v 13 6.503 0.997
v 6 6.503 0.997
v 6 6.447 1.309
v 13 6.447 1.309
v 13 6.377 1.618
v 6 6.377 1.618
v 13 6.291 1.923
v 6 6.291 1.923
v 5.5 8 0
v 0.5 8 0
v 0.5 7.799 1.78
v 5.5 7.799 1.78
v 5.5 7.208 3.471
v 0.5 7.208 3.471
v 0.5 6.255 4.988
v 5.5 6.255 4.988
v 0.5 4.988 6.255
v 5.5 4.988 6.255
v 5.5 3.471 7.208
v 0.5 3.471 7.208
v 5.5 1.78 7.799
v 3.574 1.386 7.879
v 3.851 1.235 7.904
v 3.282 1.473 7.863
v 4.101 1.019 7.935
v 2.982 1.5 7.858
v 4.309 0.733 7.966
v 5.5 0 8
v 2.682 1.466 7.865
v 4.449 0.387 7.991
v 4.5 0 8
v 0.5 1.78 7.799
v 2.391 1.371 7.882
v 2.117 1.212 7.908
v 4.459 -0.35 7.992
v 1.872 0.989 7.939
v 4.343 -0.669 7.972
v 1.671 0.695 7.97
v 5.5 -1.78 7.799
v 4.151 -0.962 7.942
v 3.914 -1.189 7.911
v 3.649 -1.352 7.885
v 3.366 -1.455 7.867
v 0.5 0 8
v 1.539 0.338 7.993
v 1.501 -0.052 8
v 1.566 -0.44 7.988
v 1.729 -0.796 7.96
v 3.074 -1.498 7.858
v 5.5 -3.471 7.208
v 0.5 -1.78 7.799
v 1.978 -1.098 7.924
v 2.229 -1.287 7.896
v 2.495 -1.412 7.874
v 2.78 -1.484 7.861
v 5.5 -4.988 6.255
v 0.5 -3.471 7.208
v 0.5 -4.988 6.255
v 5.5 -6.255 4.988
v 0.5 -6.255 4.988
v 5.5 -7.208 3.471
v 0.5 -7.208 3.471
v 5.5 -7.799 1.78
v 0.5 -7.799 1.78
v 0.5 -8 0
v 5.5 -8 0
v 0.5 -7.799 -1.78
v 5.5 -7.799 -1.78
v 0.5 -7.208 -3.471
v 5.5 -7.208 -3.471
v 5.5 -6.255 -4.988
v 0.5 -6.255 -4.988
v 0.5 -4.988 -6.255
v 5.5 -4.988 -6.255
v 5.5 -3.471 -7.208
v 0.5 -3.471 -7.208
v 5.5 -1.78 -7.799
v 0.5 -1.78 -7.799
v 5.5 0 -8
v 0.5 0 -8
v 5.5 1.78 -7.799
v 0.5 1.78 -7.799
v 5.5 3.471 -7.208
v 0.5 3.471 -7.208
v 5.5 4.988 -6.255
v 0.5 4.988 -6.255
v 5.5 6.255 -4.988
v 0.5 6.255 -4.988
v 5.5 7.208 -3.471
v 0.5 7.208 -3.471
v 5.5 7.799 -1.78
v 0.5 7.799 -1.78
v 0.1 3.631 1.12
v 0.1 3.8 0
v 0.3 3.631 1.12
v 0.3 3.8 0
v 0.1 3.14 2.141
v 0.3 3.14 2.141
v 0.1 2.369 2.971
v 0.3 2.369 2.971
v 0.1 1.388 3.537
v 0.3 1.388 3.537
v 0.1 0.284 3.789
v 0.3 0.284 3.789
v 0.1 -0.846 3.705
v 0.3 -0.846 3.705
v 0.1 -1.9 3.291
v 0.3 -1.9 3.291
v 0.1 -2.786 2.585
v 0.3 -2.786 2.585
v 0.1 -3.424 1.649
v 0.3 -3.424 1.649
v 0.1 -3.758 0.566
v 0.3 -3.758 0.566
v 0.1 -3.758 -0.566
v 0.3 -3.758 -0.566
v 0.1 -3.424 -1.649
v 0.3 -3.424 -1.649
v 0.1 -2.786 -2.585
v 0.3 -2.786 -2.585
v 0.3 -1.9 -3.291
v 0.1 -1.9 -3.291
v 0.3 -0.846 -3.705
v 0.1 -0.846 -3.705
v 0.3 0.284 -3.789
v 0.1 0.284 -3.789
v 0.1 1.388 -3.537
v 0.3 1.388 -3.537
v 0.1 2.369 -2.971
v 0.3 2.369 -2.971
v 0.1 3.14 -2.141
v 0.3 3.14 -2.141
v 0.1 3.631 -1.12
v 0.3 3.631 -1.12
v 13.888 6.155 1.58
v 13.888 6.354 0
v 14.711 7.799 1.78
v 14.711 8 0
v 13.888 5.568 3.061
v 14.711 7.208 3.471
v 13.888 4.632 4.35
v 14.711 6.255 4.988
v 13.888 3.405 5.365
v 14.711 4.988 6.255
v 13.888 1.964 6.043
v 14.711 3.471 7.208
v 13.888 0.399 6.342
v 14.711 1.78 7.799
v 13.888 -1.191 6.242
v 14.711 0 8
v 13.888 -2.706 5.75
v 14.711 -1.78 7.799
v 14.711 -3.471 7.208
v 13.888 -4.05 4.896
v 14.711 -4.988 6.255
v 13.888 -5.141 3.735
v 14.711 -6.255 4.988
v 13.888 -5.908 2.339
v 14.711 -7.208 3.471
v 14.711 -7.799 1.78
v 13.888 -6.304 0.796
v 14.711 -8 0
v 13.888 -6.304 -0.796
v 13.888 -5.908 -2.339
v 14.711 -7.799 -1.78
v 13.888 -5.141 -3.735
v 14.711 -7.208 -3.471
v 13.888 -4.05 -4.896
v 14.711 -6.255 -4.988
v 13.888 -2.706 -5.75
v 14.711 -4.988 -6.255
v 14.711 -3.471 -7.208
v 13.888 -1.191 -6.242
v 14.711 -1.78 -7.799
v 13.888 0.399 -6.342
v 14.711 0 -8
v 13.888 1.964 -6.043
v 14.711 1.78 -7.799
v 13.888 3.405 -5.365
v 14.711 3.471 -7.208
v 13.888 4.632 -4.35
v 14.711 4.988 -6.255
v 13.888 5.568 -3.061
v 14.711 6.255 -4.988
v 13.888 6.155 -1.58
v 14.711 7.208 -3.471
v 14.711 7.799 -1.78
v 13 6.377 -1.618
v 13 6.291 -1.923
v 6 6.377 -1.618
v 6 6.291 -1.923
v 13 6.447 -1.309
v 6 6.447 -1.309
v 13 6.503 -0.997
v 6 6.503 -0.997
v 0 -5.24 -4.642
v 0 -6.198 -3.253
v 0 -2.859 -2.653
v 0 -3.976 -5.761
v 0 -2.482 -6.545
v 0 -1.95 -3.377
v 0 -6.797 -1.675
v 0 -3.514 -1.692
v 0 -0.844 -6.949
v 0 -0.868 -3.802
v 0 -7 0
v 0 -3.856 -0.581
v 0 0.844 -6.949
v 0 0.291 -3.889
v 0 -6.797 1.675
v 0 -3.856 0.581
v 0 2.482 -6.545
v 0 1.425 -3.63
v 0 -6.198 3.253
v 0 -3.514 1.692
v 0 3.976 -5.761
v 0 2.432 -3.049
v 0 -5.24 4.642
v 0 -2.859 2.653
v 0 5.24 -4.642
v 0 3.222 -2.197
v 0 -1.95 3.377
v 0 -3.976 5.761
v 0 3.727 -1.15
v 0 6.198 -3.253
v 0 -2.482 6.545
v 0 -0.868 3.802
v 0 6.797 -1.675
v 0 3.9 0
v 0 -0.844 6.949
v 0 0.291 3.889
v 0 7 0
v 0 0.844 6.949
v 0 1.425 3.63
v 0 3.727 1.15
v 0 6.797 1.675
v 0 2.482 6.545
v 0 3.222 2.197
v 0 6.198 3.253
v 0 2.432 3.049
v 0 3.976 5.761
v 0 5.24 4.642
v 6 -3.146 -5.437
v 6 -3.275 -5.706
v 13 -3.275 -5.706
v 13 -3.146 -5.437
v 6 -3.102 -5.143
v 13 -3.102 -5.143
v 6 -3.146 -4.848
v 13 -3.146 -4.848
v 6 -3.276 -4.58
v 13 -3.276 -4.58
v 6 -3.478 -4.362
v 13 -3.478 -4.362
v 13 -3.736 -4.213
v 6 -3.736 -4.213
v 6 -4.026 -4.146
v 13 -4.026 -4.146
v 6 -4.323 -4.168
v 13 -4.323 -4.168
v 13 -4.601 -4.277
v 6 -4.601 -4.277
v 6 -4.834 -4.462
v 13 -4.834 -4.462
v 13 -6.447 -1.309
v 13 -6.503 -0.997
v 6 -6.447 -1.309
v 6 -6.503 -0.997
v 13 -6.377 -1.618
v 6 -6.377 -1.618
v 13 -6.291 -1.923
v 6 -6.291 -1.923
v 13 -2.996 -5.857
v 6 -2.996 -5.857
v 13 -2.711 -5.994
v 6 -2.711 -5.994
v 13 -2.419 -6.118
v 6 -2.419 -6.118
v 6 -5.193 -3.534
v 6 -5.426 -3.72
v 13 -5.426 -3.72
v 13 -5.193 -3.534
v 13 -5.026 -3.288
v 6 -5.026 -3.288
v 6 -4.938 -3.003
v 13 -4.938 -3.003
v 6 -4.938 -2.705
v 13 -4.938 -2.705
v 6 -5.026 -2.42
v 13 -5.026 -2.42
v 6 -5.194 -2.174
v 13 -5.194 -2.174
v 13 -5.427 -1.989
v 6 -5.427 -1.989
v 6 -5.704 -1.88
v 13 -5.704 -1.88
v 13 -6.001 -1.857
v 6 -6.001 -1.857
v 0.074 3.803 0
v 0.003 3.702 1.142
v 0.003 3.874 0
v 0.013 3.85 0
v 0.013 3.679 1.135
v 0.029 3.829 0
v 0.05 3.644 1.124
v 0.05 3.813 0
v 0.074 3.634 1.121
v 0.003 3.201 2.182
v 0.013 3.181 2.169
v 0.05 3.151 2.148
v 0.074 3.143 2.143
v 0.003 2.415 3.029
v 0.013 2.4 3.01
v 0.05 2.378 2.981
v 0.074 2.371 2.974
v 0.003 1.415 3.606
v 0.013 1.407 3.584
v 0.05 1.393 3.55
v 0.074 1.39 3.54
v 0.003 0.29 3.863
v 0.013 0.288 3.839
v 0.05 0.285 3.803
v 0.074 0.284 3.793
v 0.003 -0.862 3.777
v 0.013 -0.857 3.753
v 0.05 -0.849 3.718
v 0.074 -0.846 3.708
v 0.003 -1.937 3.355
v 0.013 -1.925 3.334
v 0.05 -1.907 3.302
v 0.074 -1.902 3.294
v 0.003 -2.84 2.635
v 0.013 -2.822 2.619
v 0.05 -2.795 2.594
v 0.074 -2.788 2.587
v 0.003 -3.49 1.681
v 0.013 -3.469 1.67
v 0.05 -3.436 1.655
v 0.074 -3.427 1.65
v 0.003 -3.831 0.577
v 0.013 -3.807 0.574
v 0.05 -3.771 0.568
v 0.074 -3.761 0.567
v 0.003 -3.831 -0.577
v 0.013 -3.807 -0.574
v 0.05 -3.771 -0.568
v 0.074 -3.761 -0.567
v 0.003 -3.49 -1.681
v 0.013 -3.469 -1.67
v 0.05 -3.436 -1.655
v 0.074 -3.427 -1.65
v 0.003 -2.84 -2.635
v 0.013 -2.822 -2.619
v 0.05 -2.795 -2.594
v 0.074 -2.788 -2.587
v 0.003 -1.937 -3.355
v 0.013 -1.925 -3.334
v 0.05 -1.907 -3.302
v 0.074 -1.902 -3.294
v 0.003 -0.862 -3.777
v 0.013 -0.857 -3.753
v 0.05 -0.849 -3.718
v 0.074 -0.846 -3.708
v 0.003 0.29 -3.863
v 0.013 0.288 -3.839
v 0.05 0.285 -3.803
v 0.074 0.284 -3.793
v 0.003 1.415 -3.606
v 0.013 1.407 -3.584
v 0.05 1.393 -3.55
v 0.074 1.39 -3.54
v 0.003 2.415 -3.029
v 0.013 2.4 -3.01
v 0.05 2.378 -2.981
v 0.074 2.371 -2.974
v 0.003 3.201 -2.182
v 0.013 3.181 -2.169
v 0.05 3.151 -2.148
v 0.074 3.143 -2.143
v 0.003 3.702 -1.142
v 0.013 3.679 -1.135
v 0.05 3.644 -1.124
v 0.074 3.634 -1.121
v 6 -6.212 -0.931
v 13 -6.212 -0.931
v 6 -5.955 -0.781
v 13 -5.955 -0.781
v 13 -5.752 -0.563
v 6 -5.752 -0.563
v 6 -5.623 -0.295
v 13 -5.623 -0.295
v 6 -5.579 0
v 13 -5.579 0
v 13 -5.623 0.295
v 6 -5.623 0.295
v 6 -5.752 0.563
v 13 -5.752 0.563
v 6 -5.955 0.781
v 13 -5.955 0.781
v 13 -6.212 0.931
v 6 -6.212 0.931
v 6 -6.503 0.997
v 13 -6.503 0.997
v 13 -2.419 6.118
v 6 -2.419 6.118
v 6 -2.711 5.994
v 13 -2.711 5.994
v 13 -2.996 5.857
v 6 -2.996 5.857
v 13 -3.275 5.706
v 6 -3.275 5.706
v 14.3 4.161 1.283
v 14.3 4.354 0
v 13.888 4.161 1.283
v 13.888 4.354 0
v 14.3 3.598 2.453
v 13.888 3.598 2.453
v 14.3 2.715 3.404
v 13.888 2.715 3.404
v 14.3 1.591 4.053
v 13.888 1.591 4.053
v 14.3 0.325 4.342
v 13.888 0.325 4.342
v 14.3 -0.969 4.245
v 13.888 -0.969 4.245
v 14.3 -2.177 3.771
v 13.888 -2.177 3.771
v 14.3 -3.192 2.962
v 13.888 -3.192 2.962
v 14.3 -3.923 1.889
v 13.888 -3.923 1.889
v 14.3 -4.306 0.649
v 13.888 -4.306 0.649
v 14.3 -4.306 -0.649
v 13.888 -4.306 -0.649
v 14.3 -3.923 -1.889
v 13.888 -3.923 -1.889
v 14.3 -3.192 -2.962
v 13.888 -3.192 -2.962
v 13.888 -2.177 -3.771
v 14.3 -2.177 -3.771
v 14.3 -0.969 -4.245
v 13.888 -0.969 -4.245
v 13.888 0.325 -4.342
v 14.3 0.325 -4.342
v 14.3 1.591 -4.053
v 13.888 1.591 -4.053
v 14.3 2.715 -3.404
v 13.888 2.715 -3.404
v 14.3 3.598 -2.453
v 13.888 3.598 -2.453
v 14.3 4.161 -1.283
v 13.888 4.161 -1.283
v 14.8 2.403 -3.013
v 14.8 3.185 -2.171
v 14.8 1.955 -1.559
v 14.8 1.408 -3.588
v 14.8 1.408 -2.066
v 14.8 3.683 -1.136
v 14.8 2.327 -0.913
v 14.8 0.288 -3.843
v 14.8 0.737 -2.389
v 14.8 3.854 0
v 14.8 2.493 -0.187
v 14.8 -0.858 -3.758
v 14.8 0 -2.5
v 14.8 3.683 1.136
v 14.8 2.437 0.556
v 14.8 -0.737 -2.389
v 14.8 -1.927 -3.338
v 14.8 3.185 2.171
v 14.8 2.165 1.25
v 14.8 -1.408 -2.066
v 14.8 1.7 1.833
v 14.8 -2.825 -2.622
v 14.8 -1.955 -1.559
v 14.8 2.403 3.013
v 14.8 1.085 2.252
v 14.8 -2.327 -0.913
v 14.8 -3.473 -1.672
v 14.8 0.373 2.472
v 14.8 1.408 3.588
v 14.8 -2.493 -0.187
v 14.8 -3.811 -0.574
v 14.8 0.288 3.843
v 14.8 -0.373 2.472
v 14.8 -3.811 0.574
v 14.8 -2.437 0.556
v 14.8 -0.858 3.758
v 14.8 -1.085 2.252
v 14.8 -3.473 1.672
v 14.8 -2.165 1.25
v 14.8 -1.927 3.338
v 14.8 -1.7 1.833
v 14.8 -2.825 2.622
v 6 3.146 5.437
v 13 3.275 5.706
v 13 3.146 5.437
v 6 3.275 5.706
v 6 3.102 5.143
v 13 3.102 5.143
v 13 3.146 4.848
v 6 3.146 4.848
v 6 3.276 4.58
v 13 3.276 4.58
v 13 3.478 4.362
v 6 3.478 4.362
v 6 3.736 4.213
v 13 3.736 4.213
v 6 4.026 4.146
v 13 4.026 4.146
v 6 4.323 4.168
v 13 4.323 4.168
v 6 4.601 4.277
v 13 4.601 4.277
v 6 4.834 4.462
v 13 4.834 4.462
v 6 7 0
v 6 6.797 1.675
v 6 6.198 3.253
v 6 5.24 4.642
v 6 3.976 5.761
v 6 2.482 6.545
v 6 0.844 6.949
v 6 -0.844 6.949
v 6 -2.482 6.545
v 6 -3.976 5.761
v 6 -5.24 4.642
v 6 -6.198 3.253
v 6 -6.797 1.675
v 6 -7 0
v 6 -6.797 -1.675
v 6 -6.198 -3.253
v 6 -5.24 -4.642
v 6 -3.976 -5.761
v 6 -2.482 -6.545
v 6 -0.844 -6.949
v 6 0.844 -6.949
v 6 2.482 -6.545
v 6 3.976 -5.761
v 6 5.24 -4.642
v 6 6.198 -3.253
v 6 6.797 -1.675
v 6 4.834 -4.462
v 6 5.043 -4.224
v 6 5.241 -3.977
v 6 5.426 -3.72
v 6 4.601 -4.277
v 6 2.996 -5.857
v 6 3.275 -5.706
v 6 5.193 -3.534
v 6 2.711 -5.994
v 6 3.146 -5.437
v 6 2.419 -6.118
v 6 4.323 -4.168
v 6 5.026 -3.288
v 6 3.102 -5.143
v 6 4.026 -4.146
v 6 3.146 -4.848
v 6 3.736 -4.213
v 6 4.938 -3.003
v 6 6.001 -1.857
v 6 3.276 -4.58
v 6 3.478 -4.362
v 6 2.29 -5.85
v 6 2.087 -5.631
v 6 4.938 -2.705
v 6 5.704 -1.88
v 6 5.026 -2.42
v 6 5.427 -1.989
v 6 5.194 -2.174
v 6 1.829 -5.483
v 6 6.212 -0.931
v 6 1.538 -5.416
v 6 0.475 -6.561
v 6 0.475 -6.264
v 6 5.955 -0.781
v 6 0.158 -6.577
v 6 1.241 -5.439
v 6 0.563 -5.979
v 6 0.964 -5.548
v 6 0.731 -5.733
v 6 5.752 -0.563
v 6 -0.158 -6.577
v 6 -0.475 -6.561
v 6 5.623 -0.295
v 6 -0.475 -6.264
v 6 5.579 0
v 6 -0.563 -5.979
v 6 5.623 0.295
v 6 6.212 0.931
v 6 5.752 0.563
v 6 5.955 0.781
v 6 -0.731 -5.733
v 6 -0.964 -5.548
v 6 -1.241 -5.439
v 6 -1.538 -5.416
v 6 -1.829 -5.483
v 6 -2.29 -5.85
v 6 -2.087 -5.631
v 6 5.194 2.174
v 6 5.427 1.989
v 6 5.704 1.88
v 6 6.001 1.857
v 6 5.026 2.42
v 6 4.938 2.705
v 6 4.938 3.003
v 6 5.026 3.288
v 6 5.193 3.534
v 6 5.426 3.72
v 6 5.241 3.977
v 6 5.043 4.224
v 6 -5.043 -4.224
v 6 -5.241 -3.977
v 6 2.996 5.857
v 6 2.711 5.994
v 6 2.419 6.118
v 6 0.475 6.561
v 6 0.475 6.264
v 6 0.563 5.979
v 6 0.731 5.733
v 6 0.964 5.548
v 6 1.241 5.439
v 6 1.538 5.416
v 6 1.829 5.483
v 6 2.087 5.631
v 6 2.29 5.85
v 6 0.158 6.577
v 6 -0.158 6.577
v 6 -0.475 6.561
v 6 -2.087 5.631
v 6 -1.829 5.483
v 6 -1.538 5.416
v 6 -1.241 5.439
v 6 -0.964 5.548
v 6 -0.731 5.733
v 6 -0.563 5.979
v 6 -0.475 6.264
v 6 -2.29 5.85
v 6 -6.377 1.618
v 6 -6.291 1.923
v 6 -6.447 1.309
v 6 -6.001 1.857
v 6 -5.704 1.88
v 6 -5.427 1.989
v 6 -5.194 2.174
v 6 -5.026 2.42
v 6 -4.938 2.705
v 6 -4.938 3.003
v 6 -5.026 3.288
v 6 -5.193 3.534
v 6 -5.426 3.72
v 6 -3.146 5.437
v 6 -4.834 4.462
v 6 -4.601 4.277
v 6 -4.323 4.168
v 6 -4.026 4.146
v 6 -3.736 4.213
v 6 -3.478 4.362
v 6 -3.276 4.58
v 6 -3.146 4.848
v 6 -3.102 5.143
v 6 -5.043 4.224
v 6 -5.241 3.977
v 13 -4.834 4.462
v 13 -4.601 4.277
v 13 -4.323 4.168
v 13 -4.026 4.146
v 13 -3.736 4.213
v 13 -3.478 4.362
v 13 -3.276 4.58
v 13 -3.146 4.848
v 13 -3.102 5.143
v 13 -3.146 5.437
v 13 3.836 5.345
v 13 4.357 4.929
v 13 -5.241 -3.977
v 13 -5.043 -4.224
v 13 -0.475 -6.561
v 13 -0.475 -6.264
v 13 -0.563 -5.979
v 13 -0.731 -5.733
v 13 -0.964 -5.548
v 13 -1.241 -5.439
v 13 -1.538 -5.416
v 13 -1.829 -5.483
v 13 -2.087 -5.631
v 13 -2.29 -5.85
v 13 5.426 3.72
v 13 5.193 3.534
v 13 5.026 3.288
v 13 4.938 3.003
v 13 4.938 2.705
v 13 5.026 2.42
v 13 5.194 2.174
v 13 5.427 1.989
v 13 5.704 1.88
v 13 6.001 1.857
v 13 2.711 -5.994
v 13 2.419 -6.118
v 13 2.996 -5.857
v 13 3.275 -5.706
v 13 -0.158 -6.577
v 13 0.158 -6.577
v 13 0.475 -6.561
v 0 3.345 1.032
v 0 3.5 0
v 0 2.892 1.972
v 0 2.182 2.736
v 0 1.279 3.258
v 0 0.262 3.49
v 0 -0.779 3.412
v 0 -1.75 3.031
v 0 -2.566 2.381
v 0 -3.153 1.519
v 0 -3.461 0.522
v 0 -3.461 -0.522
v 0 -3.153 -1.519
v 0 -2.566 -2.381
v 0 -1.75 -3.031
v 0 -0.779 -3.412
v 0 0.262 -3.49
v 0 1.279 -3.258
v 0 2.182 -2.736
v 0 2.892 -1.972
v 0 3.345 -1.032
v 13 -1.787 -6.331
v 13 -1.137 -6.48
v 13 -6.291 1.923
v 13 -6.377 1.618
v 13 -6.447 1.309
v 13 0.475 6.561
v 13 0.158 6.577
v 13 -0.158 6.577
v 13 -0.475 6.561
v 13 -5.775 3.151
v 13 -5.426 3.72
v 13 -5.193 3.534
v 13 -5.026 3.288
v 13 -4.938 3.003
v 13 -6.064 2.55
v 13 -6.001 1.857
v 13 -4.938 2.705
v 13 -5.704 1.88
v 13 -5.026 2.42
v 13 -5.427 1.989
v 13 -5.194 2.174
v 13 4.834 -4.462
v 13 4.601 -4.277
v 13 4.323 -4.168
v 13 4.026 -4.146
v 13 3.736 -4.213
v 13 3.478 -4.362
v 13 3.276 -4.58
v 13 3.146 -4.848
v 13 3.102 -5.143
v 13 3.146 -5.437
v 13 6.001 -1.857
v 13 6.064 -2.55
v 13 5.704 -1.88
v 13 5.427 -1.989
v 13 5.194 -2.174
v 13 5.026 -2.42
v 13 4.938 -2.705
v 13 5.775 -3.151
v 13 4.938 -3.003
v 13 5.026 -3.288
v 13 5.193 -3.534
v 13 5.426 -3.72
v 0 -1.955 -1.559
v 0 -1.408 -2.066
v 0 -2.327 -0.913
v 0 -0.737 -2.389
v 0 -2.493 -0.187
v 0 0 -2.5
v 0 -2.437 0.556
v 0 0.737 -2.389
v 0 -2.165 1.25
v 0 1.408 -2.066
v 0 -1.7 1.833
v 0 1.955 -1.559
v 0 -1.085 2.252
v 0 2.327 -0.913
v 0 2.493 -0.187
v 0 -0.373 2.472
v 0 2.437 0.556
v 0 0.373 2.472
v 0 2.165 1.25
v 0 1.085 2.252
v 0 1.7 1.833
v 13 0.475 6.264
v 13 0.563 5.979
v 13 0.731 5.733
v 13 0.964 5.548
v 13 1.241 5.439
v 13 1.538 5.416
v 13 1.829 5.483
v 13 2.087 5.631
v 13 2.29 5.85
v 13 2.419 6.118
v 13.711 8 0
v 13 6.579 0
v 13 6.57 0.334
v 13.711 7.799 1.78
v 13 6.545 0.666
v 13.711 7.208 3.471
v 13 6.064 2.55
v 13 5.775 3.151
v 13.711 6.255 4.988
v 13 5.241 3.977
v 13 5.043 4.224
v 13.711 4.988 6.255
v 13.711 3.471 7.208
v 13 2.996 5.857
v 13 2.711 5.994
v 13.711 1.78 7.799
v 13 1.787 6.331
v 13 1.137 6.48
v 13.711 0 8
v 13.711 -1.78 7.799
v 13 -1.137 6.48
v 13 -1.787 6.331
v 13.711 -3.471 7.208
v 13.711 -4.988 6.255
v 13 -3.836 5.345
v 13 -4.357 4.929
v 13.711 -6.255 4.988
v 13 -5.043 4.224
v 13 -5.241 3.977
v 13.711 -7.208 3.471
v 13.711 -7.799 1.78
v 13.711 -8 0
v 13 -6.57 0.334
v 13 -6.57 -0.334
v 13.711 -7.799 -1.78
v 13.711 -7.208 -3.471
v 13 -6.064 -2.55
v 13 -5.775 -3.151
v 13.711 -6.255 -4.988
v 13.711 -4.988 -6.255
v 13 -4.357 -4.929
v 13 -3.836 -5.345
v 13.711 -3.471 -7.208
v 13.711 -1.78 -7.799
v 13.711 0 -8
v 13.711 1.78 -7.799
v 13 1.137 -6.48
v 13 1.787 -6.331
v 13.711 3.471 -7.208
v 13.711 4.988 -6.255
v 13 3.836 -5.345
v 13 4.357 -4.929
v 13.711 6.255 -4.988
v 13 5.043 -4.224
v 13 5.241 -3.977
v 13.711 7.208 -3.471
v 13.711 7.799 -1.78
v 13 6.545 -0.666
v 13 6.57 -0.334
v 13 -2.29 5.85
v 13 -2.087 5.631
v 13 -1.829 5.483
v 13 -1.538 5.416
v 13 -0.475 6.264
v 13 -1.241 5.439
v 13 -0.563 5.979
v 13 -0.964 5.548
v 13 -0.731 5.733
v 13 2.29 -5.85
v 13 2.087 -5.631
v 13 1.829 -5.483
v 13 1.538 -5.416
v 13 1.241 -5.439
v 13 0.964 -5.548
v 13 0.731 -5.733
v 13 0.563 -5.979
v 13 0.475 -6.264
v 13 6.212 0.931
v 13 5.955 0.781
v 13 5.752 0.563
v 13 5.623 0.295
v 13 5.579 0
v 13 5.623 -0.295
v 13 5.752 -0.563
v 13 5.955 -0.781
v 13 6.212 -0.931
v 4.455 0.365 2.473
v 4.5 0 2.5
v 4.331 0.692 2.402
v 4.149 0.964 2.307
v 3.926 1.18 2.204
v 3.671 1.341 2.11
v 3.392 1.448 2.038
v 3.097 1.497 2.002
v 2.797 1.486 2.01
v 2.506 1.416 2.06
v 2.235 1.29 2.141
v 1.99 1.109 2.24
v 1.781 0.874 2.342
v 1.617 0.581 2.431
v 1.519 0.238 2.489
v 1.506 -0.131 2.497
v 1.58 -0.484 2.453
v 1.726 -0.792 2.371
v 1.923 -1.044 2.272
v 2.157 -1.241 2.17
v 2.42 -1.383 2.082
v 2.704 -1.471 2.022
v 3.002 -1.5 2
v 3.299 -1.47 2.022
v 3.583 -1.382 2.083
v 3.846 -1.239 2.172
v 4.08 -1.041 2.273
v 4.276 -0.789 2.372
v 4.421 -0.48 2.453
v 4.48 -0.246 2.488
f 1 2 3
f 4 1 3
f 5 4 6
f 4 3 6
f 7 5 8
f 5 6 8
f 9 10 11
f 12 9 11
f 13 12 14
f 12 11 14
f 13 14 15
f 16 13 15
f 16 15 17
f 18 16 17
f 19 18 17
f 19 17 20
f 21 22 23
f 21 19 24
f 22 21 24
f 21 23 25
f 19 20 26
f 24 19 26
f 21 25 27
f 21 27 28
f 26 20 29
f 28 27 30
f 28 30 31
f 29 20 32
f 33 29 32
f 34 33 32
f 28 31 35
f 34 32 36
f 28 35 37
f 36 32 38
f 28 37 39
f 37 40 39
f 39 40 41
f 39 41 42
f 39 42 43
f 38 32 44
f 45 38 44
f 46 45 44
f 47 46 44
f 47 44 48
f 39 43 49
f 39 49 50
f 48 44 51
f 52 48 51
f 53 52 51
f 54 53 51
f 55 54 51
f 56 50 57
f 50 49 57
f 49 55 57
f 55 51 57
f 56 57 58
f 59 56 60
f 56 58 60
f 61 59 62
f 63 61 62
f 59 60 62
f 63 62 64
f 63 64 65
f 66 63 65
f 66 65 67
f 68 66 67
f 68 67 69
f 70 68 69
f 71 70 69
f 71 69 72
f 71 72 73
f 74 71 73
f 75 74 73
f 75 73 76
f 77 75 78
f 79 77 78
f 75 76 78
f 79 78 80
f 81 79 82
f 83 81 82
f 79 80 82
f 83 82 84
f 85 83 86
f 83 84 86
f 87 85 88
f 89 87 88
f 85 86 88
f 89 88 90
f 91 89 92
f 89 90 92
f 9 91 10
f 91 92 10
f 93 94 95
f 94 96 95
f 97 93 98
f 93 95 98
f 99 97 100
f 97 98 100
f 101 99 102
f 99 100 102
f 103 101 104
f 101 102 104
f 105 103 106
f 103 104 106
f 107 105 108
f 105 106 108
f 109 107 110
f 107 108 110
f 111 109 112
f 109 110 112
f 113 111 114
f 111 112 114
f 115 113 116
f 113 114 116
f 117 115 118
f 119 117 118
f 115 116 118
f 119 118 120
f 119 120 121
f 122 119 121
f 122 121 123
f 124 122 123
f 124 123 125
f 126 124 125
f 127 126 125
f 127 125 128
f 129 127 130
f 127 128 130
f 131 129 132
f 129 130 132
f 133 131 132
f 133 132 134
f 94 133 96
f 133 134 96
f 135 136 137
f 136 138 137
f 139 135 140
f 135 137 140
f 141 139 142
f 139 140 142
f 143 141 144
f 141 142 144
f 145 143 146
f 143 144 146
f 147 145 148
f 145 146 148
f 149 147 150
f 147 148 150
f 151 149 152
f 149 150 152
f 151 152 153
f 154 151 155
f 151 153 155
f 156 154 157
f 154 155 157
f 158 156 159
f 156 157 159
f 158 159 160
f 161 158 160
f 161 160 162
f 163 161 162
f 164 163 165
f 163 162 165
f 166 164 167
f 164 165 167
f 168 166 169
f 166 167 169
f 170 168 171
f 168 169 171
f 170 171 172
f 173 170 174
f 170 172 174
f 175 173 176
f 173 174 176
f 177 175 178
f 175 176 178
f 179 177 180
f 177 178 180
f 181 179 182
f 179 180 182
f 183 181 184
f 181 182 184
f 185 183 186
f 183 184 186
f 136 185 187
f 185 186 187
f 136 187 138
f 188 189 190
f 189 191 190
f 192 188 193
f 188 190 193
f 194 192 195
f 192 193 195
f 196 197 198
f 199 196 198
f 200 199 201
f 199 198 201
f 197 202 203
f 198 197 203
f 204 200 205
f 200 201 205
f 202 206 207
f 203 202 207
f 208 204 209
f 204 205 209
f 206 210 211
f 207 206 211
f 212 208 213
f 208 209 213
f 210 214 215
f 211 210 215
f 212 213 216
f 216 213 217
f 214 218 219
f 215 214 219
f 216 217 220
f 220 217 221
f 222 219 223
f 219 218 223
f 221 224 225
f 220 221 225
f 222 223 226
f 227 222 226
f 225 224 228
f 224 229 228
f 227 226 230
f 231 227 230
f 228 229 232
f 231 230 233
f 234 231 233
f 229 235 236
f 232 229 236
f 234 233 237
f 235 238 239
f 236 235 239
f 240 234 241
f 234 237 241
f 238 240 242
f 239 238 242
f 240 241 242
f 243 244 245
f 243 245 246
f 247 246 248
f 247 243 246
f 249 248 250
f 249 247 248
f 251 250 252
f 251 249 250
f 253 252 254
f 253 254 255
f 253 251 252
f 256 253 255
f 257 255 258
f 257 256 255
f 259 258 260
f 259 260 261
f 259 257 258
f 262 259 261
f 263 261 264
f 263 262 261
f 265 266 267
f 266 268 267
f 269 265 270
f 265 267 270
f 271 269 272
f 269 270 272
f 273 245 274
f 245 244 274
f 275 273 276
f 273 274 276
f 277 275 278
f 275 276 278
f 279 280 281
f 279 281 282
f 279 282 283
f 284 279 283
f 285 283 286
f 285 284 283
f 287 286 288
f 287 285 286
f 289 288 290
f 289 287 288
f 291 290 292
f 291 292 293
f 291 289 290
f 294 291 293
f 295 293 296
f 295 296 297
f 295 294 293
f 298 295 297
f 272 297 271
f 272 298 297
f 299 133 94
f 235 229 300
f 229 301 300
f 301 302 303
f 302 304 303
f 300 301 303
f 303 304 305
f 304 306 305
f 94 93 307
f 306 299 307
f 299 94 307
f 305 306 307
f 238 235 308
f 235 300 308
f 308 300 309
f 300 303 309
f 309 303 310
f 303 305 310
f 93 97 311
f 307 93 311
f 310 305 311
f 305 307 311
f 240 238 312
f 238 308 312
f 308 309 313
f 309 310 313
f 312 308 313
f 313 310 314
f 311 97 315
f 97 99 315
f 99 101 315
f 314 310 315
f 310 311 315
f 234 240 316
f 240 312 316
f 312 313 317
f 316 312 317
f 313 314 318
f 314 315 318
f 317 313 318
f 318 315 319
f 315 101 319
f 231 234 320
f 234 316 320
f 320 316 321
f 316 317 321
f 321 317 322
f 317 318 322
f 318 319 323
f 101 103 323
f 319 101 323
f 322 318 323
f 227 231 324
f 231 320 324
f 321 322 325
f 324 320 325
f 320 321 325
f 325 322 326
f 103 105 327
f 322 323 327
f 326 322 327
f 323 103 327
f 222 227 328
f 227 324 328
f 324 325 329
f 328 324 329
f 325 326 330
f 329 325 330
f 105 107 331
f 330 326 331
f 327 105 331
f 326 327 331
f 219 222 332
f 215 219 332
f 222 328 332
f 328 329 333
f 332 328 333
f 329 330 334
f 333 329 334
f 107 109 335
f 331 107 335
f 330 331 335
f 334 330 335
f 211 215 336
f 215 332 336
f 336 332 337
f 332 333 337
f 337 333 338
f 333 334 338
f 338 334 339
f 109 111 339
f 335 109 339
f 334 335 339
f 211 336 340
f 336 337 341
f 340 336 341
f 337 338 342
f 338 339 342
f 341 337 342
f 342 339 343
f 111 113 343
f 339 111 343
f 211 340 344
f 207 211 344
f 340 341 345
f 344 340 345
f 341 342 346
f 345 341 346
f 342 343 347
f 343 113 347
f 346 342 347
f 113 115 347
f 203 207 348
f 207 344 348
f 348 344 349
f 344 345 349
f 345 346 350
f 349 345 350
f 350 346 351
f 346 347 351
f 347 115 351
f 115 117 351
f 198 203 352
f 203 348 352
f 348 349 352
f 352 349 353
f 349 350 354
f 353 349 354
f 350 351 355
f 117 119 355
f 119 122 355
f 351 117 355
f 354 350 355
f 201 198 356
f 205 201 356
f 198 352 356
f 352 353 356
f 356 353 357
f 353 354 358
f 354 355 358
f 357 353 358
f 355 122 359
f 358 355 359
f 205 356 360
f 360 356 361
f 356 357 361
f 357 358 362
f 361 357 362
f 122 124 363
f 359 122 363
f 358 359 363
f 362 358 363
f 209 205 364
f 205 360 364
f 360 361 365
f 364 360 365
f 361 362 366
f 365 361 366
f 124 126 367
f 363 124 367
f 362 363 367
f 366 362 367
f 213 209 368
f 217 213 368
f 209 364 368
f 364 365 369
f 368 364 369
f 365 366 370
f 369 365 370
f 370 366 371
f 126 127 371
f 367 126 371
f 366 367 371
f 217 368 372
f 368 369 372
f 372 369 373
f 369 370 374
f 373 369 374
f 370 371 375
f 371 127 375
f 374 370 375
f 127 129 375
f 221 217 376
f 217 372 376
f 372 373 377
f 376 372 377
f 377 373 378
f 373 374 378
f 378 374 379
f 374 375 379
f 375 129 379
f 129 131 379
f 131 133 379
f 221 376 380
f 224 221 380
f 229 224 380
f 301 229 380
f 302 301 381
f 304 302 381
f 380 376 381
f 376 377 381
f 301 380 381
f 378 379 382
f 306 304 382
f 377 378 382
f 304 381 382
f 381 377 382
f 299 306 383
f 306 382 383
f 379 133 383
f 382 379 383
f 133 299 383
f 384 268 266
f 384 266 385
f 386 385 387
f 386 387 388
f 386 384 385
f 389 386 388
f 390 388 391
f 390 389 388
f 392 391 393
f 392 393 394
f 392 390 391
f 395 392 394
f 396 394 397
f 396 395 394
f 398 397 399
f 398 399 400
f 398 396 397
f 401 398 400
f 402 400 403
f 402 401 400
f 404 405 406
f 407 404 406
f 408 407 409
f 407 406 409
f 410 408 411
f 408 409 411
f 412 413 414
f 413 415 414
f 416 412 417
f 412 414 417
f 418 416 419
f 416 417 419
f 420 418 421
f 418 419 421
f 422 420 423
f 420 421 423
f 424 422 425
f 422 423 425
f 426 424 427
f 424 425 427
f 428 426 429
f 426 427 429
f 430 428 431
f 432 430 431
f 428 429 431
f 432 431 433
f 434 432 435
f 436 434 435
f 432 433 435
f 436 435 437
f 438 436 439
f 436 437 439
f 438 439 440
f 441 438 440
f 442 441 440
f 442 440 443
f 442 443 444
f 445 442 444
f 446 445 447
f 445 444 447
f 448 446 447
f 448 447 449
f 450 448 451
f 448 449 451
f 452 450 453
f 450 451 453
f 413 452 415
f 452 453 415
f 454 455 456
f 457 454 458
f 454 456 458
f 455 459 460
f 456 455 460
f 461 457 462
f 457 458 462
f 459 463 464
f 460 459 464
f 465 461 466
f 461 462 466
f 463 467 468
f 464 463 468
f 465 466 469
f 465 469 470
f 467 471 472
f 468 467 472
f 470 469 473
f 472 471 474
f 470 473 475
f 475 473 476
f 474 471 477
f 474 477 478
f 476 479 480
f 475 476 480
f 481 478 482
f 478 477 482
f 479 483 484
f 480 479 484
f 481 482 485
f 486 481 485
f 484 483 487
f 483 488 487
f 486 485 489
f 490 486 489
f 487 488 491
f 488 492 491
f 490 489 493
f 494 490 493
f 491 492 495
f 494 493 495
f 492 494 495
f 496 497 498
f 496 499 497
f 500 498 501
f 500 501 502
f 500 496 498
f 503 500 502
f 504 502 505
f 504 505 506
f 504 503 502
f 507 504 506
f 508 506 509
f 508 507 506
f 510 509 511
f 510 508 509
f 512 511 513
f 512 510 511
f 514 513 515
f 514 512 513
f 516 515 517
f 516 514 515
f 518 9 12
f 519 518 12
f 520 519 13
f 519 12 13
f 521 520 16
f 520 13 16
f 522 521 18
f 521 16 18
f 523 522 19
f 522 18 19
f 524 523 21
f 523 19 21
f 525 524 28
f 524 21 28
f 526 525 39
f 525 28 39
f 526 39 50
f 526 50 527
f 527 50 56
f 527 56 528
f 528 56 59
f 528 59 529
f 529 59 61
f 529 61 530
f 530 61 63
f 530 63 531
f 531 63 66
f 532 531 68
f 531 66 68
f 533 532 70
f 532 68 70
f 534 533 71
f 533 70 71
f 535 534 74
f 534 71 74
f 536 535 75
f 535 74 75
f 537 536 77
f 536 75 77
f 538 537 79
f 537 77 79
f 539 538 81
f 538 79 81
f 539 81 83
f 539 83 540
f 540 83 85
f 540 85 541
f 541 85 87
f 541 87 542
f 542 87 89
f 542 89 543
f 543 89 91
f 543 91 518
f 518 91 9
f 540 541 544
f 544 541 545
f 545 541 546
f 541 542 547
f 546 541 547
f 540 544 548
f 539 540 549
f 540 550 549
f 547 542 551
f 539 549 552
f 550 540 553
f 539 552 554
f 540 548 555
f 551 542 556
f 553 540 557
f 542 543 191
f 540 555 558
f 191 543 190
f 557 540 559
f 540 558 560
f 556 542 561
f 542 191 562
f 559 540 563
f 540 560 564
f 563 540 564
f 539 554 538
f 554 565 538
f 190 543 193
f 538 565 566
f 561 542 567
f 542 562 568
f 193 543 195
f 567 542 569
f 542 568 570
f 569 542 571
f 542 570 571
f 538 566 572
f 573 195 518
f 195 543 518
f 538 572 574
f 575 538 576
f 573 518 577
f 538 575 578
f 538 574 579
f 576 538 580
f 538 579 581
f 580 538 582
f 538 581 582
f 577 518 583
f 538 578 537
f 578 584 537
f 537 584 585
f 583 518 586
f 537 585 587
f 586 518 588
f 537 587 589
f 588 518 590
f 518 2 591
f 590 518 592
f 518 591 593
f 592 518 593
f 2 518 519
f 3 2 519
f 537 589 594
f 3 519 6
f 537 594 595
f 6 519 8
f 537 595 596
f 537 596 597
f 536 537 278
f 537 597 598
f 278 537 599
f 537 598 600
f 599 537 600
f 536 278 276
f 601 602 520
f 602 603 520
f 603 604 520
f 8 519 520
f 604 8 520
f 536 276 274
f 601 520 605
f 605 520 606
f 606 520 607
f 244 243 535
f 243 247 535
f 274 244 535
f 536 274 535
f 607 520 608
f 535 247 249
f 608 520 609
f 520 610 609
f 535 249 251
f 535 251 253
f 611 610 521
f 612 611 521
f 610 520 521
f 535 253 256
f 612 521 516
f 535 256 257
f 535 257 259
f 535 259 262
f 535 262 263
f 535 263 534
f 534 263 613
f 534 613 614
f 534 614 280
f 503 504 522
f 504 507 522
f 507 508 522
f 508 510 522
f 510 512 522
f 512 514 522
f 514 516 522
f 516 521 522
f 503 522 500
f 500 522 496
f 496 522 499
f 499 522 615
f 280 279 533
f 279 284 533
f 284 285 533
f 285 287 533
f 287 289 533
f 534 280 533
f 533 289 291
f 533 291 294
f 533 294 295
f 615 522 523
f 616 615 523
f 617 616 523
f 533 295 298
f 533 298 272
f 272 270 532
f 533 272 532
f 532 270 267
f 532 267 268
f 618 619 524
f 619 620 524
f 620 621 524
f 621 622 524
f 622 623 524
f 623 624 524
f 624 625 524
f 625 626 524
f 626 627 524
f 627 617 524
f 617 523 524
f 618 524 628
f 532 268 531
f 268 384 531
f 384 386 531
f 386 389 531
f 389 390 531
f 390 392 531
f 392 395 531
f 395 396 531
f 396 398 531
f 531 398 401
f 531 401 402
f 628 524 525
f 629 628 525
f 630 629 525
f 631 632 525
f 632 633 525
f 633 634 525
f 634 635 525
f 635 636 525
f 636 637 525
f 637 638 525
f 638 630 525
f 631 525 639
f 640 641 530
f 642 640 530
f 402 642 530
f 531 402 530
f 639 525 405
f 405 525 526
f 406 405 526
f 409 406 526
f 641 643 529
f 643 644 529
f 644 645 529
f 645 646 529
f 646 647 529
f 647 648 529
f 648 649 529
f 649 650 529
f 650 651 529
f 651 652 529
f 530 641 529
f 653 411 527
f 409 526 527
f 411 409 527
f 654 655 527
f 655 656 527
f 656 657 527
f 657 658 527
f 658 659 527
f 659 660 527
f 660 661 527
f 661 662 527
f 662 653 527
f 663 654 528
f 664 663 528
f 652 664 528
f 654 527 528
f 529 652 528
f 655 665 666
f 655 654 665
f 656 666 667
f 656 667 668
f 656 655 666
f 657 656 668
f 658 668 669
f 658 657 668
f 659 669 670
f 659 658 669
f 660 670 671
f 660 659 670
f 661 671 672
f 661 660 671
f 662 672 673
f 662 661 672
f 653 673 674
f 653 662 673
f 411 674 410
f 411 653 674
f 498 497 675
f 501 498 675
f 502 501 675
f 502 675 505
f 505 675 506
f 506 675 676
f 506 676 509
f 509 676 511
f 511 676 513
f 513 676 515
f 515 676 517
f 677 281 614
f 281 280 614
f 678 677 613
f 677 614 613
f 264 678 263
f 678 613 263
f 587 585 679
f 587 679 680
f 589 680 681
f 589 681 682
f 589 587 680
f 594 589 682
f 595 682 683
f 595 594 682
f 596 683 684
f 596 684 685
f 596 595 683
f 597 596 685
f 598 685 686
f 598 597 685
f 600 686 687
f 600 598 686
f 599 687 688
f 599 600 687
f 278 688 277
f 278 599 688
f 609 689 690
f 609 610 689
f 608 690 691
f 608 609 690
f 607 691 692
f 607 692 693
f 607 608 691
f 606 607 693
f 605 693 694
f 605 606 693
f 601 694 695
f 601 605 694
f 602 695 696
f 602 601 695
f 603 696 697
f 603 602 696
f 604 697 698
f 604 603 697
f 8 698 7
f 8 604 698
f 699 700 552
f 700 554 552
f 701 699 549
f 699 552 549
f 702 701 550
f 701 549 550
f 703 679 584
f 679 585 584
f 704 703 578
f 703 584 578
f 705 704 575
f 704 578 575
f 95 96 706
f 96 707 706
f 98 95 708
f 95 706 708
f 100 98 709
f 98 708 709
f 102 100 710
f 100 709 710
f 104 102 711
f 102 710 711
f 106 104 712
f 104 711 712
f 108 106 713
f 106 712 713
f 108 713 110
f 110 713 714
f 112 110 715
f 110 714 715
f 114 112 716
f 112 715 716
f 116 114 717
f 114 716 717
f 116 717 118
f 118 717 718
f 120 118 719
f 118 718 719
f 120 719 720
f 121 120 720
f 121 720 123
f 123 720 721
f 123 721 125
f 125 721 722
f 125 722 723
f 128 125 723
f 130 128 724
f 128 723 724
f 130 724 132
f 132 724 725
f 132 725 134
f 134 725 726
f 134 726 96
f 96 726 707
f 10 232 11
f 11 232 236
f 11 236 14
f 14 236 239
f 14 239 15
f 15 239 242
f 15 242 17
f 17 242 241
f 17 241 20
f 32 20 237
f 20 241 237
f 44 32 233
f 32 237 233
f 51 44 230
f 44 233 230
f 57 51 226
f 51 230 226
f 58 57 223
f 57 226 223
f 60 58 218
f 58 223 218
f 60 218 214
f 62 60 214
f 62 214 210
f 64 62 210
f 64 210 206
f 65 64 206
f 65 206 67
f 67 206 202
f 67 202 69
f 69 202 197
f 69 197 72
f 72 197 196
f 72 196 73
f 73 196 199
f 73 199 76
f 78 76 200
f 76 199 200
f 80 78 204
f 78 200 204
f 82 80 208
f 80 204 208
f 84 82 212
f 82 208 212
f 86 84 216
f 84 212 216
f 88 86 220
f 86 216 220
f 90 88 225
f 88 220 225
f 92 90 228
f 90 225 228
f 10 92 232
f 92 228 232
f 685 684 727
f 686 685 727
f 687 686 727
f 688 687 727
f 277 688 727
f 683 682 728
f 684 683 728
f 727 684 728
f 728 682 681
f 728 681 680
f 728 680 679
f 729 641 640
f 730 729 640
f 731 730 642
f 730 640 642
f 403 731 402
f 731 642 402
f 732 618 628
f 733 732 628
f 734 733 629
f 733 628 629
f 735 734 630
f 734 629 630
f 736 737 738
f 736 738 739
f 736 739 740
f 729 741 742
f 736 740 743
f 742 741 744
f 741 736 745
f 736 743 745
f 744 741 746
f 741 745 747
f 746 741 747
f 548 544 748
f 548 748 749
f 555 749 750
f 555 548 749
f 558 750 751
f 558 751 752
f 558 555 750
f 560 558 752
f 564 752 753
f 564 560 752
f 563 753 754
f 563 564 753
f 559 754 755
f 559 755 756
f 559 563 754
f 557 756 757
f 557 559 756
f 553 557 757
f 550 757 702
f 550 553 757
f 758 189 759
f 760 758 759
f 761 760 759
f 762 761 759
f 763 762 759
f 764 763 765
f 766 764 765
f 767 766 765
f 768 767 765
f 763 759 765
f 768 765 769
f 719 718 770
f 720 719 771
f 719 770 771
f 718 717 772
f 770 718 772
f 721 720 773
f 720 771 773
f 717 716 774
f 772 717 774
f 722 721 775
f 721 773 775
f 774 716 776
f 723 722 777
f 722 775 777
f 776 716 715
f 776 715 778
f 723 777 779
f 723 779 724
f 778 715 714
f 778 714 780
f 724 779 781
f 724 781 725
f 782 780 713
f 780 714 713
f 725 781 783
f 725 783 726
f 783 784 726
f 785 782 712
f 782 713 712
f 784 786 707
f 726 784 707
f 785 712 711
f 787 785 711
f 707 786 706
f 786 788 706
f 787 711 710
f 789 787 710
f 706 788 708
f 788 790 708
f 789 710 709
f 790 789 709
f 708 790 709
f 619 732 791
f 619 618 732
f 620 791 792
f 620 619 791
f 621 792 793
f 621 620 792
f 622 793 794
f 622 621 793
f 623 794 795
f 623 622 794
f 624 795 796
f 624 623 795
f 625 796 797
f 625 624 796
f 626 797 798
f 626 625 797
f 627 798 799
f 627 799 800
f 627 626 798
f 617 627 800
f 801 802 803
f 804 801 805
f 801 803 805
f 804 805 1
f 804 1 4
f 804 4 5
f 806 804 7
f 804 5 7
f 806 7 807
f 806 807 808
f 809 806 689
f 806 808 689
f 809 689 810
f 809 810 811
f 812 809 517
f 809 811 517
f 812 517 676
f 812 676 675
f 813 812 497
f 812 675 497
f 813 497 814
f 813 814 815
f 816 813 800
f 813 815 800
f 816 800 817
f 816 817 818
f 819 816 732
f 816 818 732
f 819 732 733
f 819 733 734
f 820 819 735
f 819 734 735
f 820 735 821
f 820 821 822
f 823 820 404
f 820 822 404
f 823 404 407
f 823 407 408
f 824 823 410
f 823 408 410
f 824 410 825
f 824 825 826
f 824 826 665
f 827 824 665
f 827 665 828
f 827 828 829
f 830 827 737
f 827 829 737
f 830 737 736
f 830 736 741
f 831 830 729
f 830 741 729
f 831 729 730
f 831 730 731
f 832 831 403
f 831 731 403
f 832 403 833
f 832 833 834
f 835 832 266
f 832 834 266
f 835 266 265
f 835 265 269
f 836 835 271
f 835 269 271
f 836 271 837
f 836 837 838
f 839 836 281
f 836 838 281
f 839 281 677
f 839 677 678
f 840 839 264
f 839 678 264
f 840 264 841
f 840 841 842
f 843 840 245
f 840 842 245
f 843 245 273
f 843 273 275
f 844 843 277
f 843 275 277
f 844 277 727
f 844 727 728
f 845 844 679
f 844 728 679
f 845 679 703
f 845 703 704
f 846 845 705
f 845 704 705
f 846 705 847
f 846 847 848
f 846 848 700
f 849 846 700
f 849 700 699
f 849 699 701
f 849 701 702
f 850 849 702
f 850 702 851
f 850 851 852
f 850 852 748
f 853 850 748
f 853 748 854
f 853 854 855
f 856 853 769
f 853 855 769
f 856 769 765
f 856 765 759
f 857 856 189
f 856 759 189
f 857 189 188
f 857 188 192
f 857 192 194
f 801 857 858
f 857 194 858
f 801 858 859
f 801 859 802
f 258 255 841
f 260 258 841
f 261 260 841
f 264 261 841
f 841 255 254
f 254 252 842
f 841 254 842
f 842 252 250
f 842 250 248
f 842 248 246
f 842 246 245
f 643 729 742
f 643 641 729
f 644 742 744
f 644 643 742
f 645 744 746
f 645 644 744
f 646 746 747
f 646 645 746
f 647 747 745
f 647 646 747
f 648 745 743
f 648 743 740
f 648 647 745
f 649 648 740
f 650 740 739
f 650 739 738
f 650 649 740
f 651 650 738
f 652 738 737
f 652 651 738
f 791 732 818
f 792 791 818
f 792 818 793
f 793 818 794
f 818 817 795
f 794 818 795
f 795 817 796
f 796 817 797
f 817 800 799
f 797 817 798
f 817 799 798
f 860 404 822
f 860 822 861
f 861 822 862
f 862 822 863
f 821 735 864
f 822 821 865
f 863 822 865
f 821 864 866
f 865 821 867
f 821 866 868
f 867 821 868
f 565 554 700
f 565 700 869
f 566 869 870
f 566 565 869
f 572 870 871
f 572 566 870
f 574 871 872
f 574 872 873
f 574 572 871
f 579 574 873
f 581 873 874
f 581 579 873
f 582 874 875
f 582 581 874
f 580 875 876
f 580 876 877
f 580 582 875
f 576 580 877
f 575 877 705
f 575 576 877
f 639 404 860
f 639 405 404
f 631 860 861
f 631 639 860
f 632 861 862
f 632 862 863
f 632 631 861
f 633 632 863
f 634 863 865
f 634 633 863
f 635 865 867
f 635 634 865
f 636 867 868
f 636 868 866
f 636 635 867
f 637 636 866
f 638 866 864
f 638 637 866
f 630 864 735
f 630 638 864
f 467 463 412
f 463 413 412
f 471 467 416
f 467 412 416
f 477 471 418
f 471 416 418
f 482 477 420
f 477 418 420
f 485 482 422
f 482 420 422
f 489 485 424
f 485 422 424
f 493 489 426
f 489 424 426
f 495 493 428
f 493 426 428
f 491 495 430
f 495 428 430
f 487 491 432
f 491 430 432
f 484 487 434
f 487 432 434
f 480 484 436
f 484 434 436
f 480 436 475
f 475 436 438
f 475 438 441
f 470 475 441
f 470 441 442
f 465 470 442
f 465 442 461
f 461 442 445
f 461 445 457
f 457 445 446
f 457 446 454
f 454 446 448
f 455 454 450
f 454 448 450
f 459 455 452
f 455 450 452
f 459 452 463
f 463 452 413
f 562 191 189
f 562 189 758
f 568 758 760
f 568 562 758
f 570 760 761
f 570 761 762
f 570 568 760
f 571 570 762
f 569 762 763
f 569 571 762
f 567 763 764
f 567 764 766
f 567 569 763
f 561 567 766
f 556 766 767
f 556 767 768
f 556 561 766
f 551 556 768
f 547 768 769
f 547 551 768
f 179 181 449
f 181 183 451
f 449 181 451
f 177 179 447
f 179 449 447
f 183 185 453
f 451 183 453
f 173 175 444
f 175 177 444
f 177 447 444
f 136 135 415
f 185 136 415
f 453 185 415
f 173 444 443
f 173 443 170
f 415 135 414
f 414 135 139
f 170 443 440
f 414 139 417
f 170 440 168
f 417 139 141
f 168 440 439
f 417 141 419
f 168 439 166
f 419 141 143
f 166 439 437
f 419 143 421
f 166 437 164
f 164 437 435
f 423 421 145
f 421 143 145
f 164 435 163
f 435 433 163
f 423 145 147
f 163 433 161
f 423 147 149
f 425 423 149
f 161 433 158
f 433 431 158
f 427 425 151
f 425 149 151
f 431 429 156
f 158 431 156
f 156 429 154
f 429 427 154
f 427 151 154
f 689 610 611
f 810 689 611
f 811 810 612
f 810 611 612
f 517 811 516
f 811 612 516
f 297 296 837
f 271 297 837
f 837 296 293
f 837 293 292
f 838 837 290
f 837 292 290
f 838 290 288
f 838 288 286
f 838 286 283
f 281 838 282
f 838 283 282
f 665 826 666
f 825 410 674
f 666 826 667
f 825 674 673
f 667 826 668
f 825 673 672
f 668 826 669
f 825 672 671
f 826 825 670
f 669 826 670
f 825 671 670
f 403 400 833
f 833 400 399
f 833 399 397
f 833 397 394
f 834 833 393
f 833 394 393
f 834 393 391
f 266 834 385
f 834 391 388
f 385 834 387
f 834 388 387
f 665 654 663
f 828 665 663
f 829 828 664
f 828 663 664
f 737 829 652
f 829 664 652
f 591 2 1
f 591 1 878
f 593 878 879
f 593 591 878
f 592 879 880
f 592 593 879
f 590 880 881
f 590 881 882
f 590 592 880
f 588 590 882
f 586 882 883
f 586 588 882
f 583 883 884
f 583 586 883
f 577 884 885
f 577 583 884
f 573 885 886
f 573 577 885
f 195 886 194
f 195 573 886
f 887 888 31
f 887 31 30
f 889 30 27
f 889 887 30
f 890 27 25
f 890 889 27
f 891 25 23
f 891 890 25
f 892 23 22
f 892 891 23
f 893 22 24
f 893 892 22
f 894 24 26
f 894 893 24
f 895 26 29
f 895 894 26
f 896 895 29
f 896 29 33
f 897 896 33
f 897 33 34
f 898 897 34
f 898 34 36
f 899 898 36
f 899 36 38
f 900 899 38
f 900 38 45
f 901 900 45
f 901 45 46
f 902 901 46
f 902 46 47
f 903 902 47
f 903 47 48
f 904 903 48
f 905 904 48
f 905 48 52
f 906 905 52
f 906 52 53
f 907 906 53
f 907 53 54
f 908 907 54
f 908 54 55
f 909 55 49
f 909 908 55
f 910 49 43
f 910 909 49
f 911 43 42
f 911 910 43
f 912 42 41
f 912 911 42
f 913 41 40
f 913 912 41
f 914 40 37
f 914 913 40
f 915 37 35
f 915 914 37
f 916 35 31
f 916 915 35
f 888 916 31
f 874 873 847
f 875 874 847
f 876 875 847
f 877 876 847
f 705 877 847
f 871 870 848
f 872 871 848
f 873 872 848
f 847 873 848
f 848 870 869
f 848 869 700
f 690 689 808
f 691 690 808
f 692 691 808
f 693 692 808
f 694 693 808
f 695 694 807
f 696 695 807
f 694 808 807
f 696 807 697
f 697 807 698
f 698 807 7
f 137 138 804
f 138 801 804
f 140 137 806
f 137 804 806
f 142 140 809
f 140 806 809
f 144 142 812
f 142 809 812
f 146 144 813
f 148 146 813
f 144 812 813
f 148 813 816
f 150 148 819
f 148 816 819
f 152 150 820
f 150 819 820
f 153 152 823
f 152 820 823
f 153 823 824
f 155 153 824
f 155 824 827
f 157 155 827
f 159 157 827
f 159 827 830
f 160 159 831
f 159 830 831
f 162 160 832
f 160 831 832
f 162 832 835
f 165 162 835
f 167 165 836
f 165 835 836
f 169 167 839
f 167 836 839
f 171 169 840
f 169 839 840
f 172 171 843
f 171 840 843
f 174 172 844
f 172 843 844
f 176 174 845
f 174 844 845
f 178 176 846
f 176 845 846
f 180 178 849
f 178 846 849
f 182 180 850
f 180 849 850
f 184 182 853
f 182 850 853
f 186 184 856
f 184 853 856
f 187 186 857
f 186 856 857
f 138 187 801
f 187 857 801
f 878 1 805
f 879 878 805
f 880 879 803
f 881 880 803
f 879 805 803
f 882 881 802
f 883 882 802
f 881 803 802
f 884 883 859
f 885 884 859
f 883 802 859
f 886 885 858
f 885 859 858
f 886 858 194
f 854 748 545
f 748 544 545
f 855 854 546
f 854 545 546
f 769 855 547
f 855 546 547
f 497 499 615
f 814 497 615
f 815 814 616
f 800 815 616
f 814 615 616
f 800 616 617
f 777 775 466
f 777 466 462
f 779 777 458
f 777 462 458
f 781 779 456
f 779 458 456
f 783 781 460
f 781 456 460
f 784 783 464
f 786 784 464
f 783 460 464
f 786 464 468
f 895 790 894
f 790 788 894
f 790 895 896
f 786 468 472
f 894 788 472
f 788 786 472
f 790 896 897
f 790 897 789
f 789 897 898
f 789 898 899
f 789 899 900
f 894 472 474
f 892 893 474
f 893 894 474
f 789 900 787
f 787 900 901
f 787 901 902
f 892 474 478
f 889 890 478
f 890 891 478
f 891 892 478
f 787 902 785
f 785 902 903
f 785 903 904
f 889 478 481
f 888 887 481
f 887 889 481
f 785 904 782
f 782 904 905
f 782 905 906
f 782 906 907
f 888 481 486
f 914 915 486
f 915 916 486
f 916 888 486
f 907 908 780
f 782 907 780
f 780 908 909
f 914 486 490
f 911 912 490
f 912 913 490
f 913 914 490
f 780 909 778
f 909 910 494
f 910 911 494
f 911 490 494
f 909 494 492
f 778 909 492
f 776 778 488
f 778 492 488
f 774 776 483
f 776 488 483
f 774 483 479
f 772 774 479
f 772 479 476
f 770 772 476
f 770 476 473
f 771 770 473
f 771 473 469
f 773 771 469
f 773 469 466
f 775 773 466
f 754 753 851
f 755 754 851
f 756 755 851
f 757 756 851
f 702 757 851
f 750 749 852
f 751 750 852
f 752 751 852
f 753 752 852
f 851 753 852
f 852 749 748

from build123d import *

# Parameters (mm, degrees)
SKETCH2_R          = 2.5
CUT_EXTRUDE1_DEPTH = 15.8
SKETCH3_R          = 1
CUT_EXTRUDE2_DEPTH = 7
SKETCH4_R          = 1.5
CUT_EXTRUDE3_DEPTH = 9


with BuildPart() as part:
    # Sketch1 → Revolve1 (revolve)
    with BuildSketch(Plane.XY):
        with BuildLine():
            Line((0, 7), (0, 3.9))
            ThreePointArc((0, 3.9), (0.029289322, 3.829289322), (0.1, 3.8))
            Line((0.1, 3.8), (0.3, 3.8))
            Line((0.3, 3.8), (0, 3.5))
            Line((0, 3.5), (0, 0))
            Line((0, 0), (14.8, 0))
            Line((14.8, 0), (14.8, 3.854253969))
            Line((14.8, 3.854253969), (14.3, 4.354253969))
            Line((14.3, 4.354253969), (13.887802139, 4.354253969))
            Line((13.887802139, 4.354253969), (13.887802139, 6.354253969))
            Line((13.887802139, 6.354253969), (14.710675154, 8))
            Line((14.710675154, 8), (13.710675154, 8))
            Line((13.710675154, 8), (13, 6.578649691))
            Line((13, 6.578649691), (6, 6.578649691))
            Line((6, 6.578649691), (6, 7))
            Line((6, 7), (5.5, 8))
            Line((5.5, 8), (0.5, 8))
            Line((0.5, 8), (0, 7))
        make_face()
    revolve(axis=Axis((0, 0, 0), (1, 0, 0)))

    # Sketch2 → Cut-Extrude1 (cut, through all)
    with BuildSketch(Plane(origin=(14.8, 0, 0), x_dir=(0, 0, -1), z_dir=(1, 0, 0))):
        Circle(SKETCH2_R)
    extrude(amount=-CUT_EXTRUDE1_DEPTH, mode=Mode.SUBTRACT)

    # Sketch3 → Cut-Extrude2 (cut)
    with BuildSketch(Plane(origin=(6, 0, 0), x_dir=(0, 0, -1), z_dir=(1, 0, 0))):
        with Locations((2.854369126, 5.927158565)):
            Circle(SKETCH3_R)
        with Locations((0, 6.578649691)):
            Circle(SKETCH3_R)
        with Locations((5.143395441, 4.101720992)):
            Circle(SKETCH3_R)
        with Locations((6.413709208, 1.463887273)):
            Circle(SKETCH3_R)
        with Locations((6.413709208, -1.463887273)):
            Circle(SKETCH3_R)
        with Locations((5.143395441, -4.101720992)):
            Circle(SKETCH3_R)
        with Locations((2.854369126, -5.927158565)):
            Circle(SKETCH3_R)
        with Locations((0, -6.578649691)):
            Circle(SKETCH3_R)
        with Locations((-2.854369126, -5.927158565)):
            Circle(SKETCH3_R)
        with Locations((-5.143395441, -4.101720992)):
            Circle(SKETCH3_R)
        with Locations((-6.413709208, -1.463887273)):
            Circle(SKETCH3_R)
        with Locations((-6.413709208, 1.463887273)):
            Circle(SKETCH3_R)
        with Locations((-5.143395441, 4.101720992)):
            Circle(SKETCH3_R)
        with Locations((-2.854369126, 5.927158565)):
            Circle(SKETCH3_R)
    extrude(amount=CUT_EXTRUDE2_DEPTH, mode=Mode.SUBTRACT)

    # Sketch4 → Cut-Extrude3 (cut, through all)
    with BuildSketch(Plane.XY):
        with Locations((3, 0)):
            Circle(SKETCH4_R)
    extrude(amount=CUT_EXTRUDE3_DEPTH, mode=Mode.SUBTRACT)


solid = part.part
